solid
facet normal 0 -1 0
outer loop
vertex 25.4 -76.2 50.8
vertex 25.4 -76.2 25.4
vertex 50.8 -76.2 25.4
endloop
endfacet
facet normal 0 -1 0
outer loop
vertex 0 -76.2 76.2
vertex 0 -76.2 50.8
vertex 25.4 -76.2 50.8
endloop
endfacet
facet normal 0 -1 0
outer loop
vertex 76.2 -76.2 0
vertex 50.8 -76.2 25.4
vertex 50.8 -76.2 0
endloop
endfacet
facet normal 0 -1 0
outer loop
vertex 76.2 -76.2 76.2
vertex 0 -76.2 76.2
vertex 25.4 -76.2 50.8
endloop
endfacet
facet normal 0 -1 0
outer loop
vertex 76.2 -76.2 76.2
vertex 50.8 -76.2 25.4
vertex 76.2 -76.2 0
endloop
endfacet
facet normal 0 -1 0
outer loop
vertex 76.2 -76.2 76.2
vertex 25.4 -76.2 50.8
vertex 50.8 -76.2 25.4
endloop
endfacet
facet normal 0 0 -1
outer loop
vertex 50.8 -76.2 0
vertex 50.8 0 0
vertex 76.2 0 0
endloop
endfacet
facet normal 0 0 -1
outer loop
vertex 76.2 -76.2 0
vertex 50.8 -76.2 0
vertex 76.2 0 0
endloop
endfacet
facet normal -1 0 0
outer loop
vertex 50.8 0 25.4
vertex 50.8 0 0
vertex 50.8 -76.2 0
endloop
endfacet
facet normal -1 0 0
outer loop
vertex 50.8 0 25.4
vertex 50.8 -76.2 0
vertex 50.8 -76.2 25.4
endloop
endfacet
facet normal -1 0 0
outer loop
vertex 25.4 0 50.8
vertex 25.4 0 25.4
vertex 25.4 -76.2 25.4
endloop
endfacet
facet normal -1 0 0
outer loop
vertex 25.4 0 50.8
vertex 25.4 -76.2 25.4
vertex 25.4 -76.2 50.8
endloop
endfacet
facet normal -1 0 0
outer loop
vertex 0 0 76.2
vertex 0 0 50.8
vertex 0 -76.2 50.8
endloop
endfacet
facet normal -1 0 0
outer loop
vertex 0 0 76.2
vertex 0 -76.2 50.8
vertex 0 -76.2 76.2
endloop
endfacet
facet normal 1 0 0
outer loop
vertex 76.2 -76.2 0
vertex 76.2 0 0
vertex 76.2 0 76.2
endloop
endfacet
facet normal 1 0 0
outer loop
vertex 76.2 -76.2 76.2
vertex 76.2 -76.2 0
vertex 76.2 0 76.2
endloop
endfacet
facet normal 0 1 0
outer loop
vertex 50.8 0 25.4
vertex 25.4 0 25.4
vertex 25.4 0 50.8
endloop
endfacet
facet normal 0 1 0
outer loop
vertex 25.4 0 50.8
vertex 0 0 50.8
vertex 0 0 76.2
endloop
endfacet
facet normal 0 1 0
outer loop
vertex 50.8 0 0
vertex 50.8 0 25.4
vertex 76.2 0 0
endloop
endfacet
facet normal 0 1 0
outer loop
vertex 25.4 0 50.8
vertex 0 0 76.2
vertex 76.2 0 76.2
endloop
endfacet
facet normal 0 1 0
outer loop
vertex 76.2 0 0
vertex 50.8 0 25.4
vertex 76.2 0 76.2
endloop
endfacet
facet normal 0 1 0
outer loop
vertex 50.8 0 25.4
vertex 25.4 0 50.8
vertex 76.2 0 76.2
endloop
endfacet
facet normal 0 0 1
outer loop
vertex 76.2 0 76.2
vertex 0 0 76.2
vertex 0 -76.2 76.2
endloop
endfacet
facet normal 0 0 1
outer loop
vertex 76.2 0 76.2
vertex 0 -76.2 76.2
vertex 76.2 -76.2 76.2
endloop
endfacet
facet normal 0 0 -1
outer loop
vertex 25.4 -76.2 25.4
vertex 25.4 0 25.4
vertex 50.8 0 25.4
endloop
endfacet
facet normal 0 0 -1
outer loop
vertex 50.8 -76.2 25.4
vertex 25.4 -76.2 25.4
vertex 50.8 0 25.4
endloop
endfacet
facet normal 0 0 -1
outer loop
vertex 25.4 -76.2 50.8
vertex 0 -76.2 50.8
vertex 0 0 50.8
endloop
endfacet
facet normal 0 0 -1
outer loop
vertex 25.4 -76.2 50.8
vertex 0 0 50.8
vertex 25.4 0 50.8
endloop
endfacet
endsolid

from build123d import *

# Parameters (mm, degrees)
F0_W     = 76.2
F0_H     = 76.2
F2_DEPTH = 76.2
F1_W     = 50.8
F1_H     = 25.4
F3_DEPTH = 164.592
F4_W     = 25.4
F4_H     = 25.4
F5_DEPTH = 76.2


with BuildPart() as f2:
    # F0 (on Front) → F2 (new body)
    with BuildSketch(Plane.XZ):
        with Locations((38.1, 38.1)):
            Rectangle(F0_W, F0_H)
    extrude(amount=F2_DEPTH)

    # F1 (on Front) → F3 (cut)
    with BuildSketch(Plane.XZ):
        with Locations((25.4, 12.7)):
            Rectangle(F1_W, F1_H)
    extrude(amount=F3_DEPTH, mode=Mode.SUBTRACT)

    # F4 (on face) → F5 (cut)
    with BuildSketch(Plane.XZ.offset(76.2)):
        with Locations((12.7, 38.1)):
            Rectangle(F4_W, F4_H)
    extrude(amount=-F5_DEPTH, mode=Mode.SUBTRACT)


solid = f2.part
